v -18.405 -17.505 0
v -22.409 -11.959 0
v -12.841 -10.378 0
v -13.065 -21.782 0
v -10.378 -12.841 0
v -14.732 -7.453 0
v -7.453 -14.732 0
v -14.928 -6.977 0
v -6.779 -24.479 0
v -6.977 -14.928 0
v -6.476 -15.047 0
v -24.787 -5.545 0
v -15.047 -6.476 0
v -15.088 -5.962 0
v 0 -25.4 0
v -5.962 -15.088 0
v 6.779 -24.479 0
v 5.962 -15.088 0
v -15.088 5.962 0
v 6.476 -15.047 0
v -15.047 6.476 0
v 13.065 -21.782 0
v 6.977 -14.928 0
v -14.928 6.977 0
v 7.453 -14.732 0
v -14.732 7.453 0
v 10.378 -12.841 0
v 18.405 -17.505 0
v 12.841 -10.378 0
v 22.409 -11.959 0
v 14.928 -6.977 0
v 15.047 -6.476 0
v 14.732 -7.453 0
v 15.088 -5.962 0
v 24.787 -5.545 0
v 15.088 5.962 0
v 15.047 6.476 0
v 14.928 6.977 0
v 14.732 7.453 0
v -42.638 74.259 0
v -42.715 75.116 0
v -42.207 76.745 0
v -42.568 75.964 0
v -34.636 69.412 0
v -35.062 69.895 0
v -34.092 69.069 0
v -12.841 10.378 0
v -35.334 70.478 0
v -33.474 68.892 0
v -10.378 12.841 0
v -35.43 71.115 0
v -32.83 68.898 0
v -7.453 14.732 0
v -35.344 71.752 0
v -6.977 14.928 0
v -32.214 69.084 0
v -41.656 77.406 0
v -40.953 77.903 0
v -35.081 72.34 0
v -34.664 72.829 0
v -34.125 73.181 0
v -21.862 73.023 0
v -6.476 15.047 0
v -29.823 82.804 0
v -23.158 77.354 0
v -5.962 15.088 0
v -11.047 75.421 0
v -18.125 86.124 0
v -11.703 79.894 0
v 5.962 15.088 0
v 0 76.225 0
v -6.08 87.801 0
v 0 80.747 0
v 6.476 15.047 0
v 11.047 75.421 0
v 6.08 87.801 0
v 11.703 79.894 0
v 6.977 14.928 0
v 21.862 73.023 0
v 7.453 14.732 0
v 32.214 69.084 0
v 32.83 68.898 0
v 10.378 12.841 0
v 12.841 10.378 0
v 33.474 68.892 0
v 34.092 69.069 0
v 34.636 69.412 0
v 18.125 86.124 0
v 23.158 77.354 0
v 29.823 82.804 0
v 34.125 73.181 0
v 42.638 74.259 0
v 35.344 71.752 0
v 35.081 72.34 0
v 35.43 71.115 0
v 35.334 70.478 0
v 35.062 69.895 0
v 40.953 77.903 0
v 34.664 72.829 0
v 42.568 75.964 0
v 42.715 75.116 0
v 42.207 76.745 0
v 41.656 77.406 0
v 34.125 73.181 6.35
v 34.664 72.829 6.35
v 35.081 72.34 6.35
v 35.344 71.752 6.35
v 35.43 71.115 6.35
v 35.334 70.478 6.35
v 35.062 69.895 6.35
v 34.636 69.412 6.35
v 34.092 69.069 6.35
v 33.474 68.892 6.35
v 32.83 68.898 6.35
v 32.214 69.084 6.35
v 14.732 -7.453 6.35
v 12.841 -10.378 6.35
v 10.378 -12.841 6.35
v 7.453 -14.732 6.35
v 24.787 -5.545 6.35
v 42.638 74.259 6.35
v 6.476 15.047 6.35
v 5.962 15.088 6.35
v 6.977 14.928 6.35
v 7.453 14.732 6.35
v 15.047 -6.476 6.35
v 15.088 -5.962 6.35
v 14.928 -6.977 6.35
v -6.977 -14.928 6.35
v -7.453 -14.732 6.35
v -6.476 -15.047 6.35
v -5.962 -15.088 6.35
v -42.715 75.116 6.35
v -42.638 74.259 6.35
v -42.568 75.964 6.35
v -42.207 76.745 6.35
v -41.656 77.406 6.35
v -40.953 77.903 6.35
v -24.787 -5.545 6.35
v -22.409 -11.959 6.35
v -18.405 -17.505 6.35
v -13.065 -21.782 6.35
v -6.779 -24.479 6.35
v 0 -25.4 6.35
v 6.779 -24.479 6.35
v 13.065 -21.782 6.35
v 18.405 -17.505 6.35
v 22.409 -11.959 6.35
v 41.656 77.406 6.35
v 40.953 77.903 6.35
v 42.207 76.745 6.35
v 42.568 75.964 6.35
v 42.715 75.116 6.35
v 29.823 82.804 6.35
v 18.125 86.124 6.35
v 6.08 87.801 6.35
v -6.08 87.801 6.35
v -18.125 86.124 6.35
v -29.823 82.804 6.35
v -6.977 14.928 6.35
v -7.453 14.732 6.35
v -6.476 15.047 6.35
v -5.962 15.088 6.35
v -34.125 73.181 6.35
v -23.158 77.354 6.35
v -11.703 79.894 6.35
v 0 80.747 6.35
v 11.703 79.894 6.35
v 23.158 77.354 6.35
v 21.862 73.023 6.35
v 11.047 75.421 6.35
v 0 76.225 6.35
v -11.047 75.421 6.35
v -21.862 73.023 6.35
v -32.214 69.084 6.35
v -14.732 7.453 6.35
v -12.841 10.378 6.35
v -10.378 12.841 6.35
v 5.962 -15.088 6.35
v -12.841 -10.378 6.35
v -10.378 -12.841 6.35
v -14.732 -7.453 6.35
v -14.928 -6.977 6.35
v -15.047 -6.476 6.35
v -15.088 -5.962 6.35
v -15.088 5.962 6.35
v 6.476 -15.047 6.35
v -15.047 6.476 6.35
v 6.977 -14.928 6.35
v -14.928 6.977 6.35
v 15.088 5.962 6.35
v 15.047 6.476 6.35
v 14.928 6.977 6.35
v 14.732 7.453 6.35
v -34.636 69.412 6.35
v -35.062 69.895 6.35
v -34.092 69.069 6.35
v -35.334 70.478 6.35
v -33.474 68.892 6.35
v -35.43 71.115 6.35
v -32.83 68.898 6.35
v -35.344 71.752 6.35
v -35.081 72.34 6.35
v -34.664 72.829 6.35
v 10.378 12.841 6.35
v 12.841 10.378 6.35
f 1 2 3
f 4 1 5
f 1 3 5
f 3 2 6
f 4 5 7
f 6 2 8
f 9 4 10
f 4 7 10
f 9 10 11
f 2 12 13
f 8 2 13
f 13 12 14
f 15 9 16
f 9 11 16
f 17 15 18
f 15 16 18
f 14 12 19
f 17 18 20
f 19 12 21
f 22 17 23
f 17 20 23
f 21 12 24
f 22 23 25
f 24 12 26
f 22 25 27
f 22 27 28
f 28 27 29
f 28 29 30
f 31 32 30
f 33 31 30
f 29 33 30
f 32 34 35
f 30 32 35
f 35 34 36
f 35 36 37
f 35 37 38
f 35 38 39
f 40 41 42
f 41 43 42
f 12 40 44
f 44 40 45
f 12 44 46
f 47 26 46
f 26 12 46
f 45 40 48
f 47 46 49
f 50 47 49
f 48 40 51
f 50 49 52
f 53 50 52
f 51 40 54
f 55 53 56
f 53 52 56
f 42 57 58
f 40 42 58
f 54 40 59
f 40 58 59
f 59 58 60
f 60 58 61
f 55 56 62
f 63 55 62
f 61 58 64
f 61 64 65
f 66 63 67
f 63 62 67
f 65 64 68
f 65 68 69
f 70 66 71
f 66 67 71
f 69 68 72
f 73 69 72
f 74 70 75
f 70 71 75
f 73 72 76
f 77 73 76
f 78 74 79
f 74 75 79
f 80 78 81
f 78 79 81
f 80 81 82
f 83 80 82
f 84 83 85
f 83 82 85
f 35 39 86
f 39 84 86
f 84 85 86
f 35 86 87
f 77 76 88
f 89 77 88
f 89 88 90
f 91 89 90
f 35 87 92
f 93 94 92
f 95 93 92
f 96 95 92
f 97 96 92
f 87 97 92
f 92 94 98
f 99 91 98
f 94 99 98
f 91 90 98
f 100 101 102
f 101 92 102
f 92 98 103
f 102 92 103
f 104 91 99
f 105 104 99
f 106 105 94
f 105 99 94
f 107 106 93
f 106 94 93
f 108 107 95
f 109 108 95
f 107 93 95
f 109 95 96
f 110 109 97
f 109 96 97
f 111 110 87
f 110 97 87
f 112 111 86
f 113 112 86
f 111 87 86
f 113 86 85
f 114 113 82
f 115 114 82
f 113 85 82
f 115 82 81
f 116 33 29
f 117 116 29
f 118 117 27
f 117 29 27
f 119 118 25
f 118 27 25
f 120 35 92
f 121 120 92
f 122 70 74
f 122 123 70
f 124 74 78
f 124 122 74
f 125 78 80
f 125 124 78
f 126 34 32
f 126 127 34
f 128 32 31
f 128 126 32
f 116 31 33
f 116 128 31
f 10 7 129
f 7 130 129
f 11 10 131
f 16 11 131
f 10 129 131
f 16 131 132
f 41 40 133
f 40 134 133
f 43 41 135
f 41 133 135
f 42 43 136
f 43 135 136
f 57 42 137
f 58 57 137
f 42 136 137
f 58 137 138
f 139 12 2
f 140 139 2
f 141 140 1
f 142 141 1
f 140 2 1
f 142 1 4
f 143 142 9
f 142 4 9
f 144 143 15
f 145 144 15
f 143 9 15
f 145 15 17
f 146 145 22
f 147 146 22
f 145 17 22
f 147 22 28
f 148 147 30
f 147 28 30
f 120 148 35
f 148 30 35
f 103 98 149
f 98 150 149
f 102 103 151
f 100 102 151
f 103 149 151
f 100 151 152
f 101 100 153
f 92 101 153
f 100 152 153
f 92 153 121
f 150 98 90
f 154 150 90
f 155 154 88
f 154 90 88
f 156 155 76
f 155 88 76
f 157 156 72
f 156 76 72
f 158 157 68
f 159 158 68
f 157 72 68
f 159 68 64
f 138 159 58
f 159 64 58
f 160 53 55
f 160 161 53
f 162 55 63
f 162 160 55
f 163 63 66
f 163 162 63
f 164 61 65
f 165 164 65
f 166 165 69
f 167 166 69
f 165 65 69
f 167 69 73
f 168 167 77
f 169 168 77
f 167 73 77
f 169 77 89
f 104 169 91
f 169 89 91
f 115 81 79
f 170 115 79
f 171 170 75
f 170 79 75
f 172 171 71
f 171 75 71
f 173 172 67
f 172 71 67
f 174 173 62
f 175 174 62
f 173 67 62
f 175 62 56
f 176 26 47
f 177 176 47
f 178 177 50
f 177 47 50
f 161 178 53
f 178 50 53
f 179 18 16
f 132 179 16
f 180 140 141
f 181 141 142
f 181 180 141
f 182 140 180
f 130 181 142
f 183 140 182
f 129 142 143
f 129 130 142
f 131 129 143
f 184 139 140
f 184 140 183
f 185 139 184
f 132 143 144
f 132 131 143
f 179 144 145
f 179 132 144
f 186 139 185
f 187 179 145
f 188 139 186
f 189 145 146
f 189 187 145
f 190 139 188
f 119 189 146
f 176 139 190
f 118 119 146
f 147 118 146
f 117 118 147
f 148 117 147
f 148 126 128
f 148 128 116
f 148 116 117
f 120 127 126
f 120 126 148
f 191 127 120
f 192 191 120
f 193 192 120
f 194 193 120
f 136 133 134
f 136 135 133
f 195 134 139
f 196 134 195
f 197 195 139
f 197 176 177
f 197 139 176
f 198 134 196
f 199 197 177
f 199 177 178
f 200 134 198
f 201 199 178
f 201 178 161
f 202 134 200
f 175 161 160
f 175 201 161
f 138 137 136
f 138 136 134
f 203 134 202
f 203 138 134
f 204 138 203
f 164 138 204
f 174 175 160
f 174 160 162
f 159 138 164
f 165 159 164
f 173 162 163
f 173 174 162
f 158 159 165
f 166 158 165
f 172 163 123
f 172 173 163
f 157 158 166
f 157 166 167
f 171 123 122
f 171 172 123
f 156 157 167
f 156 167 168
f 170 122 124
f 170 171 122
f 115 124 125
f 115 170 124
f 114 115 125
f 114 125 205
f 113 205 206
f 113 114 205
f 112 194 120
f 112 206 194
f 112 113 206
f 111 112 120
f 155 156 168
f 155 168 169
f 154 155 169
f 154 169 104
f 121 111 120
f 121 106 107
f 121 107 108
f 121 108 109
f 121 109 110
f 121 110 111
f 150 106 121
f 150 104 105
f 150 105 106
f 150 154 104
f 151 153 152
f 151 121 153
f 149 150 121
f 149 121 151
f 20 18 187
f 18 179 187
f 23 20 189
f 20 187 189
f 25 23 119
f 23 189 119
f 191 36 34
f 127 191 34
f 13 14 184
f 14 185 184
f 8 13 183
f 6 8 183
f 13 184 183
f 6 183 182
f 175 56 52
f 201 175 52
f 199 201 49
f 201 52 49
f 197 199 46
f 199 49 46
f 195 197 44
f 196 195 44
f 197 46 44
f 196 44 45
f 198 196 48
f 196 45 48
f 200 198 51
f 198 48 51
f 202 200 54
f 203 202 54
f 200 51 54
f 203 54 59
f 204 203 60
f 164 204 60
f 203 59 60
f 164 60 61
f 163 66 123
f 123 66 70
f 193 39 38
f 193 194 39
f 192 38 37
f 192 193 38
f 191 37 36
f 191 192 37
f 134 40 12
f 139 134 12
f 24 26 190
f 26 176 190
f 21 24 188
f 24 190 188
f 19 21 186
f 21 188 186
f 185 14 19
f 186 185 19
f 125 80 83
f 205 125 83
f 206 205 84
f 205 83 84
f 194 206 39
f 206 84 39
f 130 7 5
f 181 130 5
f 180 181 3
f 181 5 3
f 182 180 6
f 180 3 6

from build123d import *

# Parameters (mm, degrees)
BOSS_EXTRUDE1_DEPTH = 6.35
FILLET1_R           = 3.302
FILLET2_R           = 3.302


with BuildPart() as part:
    # Sketch1 → Boss-Extrude1 (new body)
    with BuildSketch(Plane.XY):
        with BuildLine():
            Line((-43.182028134, 76.689298909), (-24.787442952, -5.544607461))
            ThreePointArc((-24.787442952, -5.544607461), (0, -25.4), (24.787442952, -5.544607461))
            Line((24.787442952, -5.544607461), (43.182028134, 76.689298909))
            ThreePointArc((43.182028134, 76.689298909), (0, 88.011), (-43.182028134, 76.689298909))
        make_face()
        with BuildLine():
            Line((-6.704060429, 15.0876), (6.704060429, 15.0876))
            ThreePointArc((6.704060429, 15.0876), (11.674332957, 11.674332957), (15.0876, 6.704060429))
            Line((15.0876, 6.704060429), (15.0876, -6.704060429))
            ThreePointArc((15.0876, -6.704060429), (11.674332957, -11.674332957), (6.704060429, -15.0876))
            Line((6.704060429, -15.0876), (-6.704060429, -15.0876))
            ThreePointArc((-6.704060429, -15.0876), (-11.674332957, -11.674332957), (-15.0876, -6.704060429))
            Line((-15.0876, -6.704060429), (-15.0876, 6.704060429))
            ThreePointArc((-15.0876, 6.704060429), (-11.674332957, 11.674332957), (-6.704060429, 15.0876))
        make_face(mode=Mode.SUBTRACT)
        with BuildLine():
            ThreePointArc((-34.124988821, 73.18127185), (0, 80.7466), (34.124988821, 73.18127185))
            ThreePointArc((34.124988821, 73.18127185), (35.218416261, 70.177102101), (32.214247077, 69.083673111))
            ThreePointArc((32.214247077, 69.083673111), (0, 76.2254), (-32.214247077, 69.083673111))
            ThreePointArc((-32.214247077, 69.083673111), (-35.218416261, 70.177102101), (-34.124988821, 73.18127185))
        make_face(mode=Mode.SUBTRACT)
    extrude(amount=BOSS_EXTRUDE1_DEPTH)

    # Fillet1
    fillet1_edges = [part.edges().sort_by_distance(p)[0] for p in [
        (-15.0876, 6.704060429, 3.175),
        (-15.0876, -6.704060429, 3.175),
        (-6.704060429, -15.0876, 3.175),
        (6.704060429, -15.0876, 3.175),
        (15.0876, -6.704060429, 3.175),
        (15.0876, 6.704060429, 3.175),
        (6.704060429, 15.0876, 3.175),
        (-6.704060429, 15.0876, 3.175),
    ]]
    fillet(fillet1_edges, radius=FILLET1_R)

    # Fillet2
    fillet2_edges = [part.edges().sort_by_distance(p)[0] for p in [
        (43.182028134, 76.689298909, 3.175),
        (-43.182028134, 76.689298909, 3.175),
    ]]
    fillet(fillet2_edges, radius=FILLET2_R)


solid = part.part
